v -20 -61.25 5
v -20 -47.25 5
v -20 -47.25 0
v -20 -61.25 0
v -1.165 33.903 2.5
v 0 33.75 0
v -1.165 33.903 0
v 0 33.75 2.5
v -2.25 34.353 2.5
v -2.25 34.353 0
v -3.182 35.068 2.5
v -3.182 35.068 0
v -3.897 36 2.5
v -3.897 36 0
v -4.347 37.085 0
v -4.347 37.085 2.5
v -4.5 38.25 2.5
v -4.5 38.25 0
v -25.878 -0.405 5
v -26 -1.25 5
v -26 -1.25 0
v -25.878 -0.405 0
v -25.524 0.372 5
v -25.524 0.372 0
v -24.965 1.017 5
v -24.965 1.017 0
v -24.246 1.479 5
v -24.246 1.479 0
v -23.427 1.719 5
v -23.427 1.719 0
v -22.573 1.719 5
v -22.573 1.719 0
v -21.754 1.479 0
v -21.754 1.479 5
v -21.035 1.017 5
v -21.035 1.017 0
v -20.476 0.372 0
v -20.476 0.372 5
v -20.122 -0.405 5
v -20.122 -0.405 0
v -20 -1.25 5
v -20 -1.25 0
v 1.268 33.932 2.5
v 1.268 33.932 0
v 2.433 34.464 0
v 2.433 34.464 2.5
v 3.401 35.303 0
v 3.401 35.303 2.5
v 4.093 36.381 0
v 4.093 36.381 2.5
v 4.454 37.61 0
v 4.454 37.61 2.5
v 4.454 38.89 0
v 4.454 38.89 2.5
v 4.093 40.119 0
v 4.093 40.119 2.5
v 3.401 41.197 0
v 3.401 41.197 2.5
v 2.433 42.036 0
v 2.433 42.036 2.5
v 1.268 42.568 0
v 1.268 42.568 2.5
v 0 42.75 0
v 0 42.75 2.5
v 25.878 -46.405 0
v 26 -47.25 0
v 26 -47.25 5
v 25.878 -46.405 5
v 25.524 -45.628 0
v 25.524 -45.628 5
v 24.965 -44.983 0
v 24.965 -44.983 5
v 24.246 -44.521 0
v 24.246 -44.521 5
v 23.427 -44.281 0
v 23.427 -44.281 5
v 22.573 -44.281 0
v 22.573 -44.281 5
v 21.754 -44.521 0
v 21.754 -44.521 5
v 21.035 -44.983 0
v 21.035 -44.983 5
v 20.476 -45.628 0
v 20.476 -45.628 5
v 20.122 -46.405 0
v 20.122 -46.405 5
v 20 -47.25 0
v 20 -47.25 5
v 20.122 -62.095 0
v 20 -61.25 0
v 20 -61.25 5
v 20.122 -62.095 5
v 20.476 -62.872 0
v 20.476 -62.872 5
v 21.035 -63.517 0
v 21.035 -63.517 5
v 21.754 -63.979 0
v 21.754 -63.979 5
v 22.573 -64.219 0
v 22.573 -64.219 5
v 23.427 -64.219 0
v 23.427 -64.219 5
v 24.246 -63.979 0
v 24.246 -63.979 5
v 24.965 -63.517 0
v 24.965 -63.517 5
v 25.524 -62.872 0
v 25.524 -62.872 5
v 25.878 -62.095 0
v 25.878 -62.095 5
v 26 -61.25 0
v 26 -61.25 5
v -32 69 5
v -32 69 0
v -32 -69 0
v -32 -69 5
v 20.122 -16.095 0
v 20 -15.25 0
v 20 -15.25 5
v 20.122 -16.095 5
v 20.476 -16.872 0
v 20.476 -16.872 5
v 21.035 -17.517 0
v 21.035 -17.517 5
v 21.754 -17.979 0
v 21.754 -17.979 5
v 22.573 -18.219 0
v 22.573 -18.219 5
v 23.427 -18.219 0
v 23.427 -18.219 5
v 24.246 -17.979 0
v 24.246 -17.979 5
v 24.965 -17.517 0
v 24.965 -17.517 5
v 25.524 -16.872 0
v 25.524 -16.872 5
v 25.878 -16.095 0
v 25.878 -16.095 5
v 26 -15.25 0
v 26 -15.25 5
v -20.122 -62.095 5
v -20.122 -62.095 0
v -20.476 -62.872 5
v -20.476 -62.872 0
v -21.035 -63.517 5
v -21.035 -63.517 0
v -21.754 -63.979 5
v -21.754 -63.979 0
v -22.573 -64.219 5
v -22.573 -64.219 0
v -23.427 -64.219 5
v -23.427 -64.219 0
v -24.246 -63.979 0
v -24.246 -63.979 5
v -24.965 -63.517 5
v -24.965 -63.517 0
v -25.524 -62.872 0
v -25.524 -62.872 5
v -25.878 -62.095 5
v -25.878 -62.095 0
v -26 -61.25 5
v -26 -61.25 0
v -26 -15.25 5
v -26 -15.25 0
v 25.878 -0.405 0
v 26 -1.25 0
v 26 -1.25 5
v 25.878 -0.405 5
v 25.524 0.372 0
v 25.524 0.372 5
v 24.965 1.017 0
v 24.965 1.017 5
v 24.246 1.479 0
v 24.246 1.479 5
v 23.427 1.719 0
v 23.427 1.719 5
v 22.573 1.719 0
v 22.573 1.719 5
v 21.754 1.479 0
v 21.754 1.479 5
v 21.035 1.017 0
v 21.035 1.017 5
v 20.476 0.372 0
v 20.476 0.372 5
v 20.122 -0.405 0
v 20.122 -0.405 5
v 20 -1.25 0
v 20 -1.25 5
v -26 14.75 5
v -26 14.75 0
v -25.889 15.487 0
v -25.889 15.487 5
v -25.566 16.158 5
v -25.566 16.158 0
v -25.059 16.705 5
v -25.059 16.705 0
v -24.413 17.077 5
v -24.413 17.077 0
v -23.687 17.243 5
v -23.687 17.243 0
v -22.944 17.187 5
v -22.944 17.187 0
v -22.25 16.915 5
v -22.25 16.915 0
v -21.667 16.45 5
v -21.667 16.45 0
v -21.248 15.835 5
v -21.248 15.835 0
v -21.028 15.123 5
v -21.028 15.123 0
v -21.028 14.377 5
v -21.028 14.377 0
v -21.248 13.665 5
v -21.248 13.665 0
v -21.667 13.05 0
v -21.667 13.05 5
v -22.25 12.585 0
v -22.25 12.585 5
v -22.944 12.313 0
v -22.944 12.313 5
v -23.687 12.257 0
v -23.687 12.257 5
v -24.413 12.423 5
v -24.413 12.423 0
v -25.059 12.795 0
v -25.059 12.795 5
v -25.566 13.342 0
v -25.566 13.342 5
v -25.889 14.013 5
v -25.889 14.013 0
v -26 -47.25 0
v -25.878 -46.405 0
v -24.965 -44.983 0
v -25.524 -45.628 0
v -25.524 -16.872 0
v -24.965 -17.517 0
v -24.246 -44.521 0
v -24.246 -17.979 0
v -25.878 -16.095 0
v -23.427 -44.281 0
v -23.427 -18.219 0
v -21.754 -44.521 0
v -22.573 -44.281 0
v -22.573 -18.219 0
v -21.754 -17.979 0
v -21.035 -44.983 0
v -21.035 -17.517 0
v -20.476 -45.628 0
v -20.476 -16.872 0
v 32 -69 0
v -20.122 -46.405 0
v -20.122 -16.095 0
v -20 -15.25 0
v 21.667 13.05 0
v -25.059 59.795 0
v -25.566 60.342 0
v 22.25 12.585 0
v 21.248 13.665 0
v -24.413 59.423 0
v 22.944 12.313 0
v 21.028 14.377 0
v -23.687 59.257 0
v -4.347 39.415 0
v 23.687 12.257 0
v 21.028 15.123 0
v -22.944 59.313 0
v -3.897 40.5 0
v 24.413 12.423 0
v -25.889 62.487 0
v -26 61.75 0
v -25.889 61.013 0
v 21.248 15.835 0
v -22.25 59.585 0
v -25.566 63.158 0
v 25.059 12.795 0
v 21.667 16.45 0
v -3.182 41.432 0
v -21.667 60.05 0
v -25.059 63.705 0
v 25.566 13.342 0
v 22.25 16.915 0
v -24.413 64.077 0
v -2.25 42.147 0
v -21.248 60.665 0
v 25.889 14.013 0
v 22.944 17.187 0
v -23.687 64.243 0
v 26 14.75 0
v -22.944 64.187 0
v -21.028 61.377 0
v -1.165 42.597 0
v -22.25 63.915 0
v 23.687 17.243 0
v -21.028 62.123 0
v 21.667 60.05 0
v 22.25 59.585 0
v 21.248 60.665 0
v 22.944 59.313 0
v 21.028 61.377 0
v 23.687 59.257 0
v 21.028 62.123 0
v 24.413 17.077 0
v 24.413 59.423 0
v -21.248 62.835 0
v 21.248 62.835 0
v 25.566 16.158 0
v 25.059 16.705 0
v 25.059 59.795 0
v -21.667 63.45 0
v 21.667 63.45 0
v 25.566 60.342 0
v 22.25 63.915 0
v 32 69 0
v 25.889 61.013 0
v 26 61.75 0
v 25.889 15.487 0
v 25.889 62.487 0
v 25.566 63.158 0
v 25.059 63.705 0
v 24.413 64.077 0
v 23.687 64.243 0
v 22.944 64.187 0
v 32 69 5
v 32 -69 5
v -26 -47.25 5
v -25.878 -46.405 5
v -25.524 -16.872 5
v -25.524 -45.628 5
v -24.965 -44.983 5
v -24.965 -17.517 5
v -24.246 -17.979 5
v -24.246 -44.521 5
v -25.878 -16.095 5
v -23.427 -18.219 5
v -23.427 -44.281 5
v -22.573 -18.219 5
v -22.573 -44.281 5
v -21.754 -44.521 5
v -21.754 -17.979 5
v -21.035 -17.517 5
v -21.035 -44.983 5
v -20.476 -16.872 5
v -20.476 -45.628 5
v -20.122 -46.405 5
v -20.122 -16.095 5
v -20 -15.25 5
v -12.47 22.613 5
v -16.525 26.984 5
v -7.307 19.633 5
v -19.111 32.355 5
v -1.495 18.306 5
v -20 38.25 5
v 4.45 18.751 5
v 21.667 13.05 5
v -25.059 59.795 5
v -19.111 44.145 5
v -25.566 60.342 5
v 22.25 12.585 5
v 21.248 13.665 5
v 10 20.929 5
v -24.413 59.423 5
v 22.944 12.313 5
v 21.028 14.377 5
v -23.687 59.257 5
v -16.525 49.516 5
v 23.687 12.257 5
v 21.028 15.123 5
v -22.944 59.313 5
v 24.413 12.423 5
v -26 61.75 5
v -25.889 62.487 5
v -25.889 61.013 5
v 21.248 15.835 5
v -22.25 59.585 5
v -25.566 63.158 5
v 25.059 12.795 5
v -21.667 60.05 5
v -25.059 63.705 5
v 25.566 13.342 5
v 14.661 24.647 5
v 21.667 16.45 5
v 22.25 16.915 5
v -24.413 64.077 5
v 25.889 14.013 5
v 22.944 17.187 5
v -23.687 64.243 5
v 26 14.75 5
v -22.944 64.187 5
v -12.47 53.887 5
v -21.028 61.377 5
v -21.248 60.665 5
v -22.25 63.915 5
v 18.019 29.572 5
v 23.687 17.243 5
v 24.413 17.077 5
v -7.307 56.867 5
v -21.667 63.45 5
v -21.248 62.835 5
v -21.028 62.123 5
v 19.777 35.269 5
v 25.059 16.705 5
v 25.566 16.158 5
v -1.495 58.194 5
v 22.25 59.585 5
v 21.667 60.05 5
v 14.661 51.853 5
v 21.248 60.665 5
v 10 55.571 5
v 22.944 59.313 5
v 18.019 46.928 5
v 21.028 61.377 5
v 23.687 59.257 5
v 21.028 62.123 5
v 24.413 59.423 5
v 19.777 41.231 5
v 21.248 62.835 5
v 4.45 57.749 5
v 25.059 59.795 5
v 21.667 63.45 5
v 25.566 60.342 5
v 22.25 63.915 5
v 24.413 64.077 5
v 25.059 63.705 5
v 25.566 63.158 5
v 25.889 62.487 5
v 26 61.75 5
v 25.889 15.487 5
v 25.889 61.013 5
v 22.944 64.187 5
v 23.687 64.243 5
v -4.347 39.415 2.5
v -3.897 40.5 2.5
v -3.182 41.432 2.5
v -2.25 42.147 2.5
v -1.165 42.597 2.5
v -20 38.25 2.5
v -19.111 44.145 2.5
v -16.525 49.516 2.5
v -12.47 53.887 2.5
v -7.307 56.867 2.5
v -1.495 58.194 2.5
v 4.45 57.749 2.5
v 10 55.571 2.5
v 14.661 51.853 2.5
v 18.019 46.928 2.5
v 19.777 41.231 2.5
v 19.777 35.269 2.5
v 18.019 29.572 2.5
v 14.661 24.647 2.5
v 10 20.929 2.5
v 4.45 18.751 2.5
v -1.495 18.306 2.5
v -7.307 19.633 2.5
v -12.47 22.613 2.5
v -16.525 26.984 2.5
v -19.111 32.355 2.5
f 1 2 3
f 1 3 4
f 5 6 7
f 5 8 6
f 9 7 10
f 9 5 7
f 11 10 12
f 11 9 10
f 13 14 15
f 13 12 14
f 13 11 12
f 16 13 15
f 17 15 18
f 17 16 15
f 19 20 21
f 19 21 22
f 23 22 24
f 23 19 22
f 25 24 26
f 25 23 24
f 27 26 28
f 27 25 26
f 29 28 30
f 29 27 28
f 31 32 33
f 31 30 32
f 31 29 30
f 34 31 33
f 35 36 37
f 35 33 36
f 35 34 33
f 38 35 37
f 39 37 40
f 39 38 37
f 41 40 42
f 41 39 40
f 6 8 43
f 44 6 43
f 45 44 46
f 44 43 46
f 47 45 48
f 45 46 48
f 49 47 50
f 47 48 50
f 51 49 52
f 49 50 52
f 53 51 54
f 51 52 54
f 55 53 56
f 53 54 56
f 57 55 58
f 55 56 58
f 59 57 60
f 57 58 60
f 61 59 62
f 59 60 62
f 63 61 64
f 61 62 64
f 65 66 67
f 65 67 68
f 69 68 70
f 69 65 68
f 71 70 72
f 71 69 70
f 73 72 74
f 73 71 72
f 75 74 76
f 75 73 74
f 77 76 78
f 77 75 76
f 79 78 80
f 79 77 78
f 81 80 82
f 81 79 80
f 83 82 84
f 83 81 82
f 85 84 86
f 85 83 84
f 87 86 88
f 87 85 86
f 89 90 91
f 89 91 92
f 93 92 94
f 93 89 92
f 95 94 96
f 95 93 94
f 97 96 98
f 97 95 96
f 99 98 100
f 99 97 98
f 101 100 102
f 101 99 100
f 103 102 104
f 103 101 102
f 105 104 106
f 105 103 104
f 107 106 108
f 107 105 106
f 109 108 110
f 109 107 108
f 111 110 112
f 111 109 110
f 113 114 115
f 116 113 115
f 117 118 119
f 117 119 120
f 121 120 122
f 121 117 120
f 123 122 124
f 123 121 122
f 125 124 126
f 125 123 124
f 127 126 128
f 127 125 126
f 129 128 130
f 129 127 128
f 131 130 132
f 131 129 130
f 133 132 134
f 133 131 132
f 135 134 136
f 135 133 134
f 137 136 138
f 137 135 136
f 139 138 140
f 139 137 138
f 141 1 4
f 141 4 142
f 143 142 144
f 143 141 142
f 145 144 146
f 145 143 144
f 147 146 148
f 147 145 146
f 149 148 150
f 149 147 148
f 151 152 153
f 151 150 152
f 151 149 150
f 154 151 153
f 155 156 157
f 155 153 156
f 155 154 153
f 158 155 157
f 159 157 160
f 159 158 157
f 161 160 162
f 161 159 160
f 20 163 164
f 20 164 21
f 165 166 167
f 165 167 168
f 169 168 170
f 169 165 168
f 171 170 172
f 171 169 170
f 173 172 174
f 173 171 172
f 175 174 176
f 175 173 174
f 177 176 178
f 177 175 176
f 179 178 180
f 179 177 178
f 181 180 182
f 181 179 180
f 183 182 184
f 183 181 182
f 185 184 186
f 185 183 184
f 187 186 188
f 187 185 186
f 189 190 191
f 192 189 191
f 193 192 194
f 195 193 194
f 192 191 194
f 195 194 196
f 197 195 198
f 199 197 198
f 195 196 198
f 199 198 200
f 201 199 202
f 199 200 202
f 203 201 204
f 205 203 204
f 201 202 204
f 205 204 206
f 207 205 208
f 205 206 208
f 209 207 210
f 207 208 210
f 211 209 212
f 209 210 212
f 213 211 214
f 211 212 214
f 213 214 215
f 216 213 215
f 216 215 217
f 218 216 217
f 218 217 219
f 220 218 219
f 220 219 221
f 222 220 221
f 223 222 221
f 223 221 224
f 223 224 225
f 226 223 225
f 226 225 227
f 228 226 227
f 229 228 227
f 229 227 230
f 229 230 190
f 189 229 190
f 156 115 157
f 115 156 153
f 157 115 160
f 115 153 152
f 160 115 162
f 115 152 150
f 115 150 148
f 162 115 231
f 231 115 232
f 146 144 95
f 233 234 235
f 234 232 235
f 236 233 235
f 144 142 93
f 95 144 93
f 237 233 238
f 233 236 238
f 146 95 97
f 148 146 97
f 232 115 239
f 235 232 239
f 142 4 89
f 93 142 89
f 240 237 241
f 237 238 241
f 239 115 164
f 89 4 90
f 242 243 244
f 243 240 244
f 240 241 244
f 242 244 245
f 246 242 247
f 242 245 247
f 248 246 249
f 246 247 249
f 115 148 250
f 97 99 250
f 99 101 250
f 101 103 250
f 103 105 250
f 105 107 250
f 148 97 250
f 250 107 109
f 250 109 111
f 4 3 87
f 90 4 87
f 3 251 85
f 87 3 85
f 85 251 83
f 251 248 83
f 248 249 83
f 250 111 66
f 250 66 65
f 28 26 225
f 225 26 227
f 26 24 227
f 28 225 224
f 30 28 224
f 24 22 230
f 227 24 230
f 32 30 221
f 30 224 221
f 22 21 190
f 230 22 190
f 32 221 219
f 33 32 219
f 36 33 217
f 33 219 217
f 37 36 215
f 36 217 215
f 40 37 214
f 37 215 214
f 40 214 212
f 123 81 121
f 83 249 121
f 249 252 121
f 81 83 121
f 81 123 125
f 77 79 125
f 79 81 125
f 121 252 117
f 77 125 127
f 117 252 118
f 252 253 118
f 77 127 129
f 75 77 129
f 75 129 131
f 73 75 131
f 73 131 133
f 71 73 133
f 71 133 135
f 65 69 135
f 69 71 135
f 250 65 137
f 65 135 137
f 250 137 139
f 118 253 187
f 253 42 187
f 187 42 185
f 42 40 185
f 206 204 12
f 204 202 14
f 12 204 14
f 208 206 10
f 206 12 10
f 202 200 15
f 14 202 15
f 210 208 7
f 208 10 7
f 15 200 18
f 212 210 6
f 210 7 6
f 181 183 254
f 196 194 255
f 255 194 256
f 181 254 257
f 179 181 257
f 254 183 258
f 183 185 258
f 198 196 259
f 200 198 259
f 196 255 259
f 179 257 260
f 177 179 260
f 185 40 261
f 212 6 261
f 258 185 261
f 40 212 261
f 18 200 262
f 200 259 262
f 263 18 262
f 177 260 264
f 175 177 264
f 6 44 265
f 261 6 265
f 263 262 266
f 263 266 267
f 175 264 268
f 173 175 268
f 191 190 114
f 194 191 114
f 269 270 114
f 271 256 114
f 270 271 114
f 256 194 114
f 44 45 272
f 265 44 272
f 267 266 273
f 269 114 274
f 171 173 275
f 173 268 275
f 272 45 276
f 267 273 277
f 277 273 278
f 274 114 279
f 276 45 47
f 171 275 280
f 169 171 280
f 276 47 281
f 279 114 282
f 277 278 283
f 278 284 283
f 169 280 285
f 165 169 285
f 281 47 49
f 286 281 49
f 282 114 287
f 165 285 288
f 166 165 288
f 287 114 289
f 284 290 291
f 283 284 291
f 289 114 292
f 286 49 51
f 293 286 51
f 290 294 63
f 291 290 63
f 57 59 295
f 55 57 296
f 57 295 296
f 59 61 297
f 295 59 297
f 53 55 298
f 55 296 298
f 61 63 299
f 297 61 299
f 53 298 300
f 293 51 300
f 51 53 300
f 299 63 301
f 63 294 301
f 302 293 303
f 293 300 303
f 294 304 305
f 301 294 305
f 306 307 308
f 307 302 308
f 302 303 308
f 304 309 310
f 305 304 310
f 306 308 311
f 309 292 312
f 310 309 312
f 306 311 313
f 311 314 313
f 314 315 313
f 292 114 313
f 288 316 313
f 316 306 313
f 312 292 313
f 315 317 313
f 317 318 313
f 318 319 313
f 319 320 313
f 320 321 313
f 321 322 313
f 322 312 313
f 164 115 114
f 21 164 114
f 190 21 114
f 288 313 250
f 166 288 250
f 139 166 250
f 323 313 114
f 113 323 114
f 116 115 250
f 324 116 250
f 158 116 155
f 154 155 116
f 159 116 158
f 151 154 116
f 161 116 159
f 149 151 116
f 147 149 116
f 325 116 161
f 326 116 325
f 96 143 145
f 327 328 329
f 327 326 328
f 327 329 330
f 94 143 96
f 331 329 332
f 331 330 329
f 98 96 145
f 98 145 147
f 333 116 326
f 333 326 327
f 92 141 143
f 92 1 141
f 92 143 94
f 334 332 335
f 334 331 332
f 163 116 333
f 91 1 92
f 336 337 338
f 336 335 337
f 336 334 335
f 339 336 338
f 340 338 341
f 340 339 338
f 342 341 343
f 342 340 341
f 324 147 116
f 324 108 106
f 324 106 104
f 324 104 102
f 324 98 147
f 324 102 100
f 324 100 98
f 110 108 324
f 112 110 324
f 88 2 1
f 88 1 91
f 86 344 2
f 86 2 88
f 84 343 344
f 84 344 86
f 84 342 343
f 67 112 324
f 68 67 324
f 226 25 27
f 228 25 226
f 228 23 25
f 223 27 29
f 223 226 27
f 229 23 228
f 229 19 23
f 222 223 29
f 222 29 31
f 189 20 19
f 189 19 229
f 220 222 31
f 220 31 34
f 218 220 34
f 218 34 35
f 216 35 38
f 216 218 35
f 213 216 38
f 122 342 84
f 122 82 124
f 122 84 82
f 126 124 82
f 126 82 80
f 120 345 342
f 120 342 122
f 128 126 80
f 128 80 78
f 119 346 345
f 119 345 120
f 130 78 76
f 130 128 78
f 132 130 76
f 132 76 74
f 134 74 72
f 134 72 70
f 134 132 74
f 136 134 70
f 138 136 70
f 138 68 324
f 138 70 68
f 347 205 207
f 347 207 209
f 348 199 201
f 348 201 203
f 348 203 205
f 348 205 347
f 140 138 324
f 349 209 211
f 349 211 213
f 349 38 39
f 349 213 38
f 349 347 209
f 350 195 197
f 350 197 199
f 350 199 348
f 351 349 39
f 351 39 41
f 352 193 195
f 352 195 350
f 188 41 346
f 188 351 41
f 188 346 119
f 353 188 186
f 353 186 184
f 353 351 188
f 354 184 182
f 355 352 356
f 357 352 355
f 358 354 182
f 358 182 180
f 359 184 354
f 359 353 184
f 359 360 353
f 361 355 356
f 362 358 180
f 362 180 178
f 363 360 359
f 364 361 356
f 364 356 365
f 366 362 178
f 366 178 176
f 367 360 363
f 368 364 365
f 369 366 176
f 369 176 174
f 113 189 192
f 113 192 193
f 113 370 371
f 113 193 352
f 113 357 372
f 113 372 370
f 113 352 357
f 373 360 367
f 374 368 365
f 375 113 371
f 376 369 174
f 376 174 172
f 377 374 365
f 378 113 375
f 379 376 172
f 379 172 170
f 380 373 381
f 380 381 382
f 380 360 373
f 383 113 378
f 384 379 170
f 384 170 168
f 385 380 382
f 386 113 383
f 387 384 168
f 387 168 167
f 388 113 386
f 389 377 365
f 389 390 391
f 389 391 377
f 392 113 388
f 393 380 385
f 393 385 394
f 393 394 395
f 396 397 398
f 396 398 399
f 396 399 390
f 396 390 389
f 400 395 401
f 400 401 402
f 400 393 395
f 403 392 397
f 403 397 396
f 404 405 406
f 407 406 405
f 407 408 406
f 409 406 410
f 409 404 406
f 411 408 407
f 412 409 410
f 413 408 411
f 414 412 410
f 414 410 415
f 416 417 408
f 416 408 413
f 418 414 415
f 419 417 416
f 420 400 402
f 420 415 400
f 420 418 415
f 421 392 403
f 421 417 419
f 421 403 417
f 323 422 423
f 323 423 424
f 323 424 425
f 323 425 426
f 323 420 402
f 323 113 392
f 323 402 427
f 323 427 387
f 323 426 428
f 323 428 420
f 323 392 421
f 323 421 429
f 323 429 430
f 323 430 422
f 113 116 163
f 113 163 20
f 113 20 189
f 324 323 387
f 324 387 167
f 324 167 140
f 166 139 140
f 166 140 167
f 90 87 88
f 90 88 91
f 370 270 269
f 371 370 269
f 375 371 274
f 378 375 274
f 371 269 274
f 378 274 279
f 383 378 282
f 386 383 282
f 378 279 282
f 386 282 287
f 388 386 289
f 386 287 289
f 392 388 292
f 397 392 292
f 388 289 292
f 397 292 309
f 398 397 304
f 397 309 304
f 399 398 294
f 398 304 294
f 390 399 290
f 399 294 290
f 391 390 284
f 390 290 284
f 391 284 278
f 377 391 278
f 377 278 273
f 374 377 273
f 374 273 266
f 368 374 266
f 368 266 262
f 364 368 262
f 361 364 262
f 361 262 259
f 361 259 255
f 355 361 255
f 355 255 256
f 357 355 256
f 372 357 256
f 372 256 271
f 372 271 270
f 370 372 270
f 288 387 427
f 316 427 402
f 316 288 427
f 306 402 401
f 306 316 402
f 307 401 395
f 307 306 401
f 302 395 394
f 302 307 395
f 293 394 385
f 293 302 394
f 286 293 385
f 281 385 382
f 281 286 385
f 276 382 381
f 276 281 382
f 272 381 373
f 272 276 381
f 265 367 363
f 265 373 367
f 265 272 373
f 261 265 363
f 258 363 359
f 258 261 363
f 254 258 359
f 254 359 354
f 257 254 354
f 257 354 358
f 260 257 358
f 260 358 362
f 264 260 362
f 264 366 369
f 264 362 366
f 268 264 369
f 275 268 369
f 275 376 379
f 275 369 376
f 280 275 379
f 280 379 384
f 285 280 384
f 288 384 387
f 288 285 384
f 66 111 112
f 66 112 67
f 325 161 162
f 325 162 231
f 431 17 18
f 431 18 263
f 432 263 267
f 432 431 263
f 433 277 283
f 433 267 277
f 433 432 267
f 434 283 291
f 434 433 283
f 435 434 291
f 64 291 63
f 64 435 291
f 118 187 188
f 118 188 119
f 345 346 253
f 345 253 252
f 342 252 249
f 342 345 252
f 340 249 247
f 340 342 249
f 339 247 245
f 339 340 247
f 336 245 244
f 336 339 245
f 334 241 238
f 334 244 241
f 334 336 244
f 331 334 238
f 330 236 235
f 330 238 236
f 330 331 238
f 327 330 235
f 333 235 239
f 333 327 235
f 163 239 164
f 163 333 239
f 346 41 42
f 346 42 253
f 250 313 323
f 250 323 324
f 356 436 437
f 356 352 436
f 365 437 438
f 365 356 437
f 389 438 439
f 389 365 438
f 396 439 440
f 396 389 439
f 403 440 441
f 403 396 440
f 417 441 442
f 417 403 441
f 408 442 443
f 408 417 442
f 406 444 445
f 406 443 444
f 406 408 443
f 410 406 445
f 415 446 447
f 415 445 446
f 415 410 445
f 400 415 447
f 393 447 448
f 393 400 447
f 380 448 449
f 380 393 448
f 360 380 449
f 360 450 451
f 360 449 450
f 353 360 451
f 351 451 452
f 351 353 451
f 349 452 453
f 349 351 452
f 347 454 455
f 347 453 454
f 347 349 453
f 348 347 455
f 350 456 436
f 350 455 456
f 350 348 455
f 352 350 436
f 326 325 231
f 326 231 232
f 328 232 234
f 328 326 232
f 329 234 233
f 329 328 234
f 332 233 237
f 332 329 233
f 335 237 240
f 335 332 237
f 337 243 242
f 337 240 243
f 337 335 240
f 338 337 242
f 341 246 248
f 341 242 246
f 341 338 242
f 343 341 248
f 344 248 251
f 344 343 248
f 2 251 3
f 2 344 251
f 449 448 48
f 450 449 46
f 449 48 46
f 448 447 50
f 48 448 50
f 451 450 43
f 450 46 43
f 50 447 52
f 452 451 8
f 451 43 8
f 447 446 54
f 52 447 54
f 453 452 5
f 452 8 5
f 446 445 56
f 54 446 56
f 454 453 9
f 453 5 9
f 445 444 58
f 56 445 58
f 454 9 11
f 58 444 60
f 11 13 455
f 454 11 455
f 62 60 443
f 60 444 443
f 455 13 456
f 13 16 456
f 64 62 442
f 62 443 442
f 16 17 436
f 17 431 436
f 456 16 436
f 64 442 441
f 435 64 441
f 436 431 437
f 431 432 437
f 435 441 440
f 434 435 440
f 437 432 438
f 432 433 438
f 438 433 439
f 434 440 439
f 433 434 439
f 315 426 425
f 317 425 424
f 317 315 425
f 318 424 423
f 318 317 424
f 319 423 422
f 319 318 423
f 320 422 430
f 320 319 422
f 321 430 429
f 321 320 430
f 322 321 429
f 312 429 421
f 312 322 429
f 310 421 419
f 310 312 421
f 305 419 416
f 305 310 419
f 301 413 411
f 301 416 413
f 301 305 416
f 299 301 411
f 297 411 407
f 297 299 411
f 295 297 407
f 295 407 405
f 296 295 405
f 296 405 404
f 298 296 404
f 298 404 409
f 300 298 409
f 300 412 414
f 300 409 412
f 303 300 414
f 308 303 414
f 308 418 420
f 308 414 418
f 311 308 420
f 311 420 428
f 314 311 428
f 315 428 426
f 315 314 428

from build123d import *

# Parameters (mm, degrees)
PAD_DEPTH            = 5
SKETCH001_R          = 2.5
POCKET_DEPTH         = 288.500559
POCKET001_DEPTH      = 283.500559
POCKET001_DEPTH_BACK = 288.500559
SKETCH003_R          = 20
POCKET002_DEPTH      = 2.5
SKETCH004_R          = 4.5
POCKET003_DEPTH      = 288.500559
POCKET003_DEPTH_BACK = 283.500559


with BuildPart() as part:
    # Sketch → Pad (new body)
    with BuildSketch(Plane.XY):
        Polygon((0, 0), (0, 69), (32, 69), (32, -69), (0, -69), align=None)
    pad = extrude(amount=PAD_DEPTH)

    # Sketch001 → Pocket (cut, through all)
    with BuildSketch(Plane(origin=(23.5, 14.75, 0), x_dir=(1, 0, 0), z_dir=(0, 0, 1))):
        Circle(SKETCH001_R)
        with Locations((0, 47)):
            Circle(SKETCH001_R)
    pocket = extrude(amount=POCKET_DEPTH, mode=Mode.SUBTRACT)

    # Sketch002 → Pocket001 (cut, two sides)
    with BuildSketch(Plane(origin=(23, -1.25, 0), x_dir=(1, 0, 0), z_dir=(0, 0, 1))) as pocket001_sk:
        with BuildLine():
            ThreePointArc((3, 0), (0, 3), (-3, 0))
            Line((-3, 0), (-3, -14))
            ThreePointArc((-3, -14), (0, -17), (3, -14))
            Line((3, -14), (3, 0))
        make_face()
        with BuildLine():
            ThreePointArc((3, -46), (0, -43), (-3, -46))
            Line((-3, -46), (-3, -60))
            ThreePointArc((-3, -60), (0, -63), (3, -60))
            Line((3, -60), (3, -46))
        make_face()
    pocket001 = extrude(amount=-POCKET001_DEPTH, mode=Mode.SUBTRACT) + extrude(pocket001_sk.sketch, amount=POCKET001_DEPTH_BACK, mode=Mode.SUBTRACT)

    # Sketch003 → Pocket002 (cut)
    with BuildSketch(Plane(origin=(0, 38.25, 5), x_dir=(1, 0, 0), z_dir=(0, 0, 1))):
        Circle(SKETCH003_R)
    pocket002 = extrude(amount=-POCKET002_DEPTH, mode=Mode.SUBTRACT)

    # Sketch004 → Pocket003 (cut, two sides)
    with BuildSketch(Plane(origin=(0, 38.25, 5), x_dir=(1, 0, 0), z_dir=(0, 0, 1))) as pocket003_sk:
        Circle(SKETCH004_R)
    pocket003 = extrude(amount=-POCKET003_DEPTH, mode=Mode.SUBTRACT) + extrude(pocket003_sk.sketch, amount=POCKET003_DEPTH_BACK, mode=Mode.SUBTRACT)

    # Mirrored: Pad, Pocket, Pocket001, Pocket002, Pocket003 across Sketch V_Axis
    add(pad.mirror(Plane(origin=(0, 0, 0), x_dir=(0, 0, 1), z_dir=(1, 0, 0))))
    add(pocket.mirror(Plane(origin=(0, 0, 0), x_dir=(0, 0, 1), z_dir=(1, 0, 0))), mode=Mode.SUBTRACT)
    add(pocket001.mirror(Plane(origin=(0, 0, 0), x_dir=(0, 0, 1), z_dir=(1, 0, 0))), mode=Mode.SUBTRACT)
    add(pocket002.mirror(Plane(origin=(0, 0, 0), x_dir=(0, 0, 1), z_dir=(1, 0, 0))), mode=Mode.SUBTRACT)
    add(pocket003.mirror(Plane(origin=(0, 0, 0), x_dir=(0, 0, 1), z_dir=(1, 0, 0))), mode=Mode.SUBTRACT)


solid = part.part
